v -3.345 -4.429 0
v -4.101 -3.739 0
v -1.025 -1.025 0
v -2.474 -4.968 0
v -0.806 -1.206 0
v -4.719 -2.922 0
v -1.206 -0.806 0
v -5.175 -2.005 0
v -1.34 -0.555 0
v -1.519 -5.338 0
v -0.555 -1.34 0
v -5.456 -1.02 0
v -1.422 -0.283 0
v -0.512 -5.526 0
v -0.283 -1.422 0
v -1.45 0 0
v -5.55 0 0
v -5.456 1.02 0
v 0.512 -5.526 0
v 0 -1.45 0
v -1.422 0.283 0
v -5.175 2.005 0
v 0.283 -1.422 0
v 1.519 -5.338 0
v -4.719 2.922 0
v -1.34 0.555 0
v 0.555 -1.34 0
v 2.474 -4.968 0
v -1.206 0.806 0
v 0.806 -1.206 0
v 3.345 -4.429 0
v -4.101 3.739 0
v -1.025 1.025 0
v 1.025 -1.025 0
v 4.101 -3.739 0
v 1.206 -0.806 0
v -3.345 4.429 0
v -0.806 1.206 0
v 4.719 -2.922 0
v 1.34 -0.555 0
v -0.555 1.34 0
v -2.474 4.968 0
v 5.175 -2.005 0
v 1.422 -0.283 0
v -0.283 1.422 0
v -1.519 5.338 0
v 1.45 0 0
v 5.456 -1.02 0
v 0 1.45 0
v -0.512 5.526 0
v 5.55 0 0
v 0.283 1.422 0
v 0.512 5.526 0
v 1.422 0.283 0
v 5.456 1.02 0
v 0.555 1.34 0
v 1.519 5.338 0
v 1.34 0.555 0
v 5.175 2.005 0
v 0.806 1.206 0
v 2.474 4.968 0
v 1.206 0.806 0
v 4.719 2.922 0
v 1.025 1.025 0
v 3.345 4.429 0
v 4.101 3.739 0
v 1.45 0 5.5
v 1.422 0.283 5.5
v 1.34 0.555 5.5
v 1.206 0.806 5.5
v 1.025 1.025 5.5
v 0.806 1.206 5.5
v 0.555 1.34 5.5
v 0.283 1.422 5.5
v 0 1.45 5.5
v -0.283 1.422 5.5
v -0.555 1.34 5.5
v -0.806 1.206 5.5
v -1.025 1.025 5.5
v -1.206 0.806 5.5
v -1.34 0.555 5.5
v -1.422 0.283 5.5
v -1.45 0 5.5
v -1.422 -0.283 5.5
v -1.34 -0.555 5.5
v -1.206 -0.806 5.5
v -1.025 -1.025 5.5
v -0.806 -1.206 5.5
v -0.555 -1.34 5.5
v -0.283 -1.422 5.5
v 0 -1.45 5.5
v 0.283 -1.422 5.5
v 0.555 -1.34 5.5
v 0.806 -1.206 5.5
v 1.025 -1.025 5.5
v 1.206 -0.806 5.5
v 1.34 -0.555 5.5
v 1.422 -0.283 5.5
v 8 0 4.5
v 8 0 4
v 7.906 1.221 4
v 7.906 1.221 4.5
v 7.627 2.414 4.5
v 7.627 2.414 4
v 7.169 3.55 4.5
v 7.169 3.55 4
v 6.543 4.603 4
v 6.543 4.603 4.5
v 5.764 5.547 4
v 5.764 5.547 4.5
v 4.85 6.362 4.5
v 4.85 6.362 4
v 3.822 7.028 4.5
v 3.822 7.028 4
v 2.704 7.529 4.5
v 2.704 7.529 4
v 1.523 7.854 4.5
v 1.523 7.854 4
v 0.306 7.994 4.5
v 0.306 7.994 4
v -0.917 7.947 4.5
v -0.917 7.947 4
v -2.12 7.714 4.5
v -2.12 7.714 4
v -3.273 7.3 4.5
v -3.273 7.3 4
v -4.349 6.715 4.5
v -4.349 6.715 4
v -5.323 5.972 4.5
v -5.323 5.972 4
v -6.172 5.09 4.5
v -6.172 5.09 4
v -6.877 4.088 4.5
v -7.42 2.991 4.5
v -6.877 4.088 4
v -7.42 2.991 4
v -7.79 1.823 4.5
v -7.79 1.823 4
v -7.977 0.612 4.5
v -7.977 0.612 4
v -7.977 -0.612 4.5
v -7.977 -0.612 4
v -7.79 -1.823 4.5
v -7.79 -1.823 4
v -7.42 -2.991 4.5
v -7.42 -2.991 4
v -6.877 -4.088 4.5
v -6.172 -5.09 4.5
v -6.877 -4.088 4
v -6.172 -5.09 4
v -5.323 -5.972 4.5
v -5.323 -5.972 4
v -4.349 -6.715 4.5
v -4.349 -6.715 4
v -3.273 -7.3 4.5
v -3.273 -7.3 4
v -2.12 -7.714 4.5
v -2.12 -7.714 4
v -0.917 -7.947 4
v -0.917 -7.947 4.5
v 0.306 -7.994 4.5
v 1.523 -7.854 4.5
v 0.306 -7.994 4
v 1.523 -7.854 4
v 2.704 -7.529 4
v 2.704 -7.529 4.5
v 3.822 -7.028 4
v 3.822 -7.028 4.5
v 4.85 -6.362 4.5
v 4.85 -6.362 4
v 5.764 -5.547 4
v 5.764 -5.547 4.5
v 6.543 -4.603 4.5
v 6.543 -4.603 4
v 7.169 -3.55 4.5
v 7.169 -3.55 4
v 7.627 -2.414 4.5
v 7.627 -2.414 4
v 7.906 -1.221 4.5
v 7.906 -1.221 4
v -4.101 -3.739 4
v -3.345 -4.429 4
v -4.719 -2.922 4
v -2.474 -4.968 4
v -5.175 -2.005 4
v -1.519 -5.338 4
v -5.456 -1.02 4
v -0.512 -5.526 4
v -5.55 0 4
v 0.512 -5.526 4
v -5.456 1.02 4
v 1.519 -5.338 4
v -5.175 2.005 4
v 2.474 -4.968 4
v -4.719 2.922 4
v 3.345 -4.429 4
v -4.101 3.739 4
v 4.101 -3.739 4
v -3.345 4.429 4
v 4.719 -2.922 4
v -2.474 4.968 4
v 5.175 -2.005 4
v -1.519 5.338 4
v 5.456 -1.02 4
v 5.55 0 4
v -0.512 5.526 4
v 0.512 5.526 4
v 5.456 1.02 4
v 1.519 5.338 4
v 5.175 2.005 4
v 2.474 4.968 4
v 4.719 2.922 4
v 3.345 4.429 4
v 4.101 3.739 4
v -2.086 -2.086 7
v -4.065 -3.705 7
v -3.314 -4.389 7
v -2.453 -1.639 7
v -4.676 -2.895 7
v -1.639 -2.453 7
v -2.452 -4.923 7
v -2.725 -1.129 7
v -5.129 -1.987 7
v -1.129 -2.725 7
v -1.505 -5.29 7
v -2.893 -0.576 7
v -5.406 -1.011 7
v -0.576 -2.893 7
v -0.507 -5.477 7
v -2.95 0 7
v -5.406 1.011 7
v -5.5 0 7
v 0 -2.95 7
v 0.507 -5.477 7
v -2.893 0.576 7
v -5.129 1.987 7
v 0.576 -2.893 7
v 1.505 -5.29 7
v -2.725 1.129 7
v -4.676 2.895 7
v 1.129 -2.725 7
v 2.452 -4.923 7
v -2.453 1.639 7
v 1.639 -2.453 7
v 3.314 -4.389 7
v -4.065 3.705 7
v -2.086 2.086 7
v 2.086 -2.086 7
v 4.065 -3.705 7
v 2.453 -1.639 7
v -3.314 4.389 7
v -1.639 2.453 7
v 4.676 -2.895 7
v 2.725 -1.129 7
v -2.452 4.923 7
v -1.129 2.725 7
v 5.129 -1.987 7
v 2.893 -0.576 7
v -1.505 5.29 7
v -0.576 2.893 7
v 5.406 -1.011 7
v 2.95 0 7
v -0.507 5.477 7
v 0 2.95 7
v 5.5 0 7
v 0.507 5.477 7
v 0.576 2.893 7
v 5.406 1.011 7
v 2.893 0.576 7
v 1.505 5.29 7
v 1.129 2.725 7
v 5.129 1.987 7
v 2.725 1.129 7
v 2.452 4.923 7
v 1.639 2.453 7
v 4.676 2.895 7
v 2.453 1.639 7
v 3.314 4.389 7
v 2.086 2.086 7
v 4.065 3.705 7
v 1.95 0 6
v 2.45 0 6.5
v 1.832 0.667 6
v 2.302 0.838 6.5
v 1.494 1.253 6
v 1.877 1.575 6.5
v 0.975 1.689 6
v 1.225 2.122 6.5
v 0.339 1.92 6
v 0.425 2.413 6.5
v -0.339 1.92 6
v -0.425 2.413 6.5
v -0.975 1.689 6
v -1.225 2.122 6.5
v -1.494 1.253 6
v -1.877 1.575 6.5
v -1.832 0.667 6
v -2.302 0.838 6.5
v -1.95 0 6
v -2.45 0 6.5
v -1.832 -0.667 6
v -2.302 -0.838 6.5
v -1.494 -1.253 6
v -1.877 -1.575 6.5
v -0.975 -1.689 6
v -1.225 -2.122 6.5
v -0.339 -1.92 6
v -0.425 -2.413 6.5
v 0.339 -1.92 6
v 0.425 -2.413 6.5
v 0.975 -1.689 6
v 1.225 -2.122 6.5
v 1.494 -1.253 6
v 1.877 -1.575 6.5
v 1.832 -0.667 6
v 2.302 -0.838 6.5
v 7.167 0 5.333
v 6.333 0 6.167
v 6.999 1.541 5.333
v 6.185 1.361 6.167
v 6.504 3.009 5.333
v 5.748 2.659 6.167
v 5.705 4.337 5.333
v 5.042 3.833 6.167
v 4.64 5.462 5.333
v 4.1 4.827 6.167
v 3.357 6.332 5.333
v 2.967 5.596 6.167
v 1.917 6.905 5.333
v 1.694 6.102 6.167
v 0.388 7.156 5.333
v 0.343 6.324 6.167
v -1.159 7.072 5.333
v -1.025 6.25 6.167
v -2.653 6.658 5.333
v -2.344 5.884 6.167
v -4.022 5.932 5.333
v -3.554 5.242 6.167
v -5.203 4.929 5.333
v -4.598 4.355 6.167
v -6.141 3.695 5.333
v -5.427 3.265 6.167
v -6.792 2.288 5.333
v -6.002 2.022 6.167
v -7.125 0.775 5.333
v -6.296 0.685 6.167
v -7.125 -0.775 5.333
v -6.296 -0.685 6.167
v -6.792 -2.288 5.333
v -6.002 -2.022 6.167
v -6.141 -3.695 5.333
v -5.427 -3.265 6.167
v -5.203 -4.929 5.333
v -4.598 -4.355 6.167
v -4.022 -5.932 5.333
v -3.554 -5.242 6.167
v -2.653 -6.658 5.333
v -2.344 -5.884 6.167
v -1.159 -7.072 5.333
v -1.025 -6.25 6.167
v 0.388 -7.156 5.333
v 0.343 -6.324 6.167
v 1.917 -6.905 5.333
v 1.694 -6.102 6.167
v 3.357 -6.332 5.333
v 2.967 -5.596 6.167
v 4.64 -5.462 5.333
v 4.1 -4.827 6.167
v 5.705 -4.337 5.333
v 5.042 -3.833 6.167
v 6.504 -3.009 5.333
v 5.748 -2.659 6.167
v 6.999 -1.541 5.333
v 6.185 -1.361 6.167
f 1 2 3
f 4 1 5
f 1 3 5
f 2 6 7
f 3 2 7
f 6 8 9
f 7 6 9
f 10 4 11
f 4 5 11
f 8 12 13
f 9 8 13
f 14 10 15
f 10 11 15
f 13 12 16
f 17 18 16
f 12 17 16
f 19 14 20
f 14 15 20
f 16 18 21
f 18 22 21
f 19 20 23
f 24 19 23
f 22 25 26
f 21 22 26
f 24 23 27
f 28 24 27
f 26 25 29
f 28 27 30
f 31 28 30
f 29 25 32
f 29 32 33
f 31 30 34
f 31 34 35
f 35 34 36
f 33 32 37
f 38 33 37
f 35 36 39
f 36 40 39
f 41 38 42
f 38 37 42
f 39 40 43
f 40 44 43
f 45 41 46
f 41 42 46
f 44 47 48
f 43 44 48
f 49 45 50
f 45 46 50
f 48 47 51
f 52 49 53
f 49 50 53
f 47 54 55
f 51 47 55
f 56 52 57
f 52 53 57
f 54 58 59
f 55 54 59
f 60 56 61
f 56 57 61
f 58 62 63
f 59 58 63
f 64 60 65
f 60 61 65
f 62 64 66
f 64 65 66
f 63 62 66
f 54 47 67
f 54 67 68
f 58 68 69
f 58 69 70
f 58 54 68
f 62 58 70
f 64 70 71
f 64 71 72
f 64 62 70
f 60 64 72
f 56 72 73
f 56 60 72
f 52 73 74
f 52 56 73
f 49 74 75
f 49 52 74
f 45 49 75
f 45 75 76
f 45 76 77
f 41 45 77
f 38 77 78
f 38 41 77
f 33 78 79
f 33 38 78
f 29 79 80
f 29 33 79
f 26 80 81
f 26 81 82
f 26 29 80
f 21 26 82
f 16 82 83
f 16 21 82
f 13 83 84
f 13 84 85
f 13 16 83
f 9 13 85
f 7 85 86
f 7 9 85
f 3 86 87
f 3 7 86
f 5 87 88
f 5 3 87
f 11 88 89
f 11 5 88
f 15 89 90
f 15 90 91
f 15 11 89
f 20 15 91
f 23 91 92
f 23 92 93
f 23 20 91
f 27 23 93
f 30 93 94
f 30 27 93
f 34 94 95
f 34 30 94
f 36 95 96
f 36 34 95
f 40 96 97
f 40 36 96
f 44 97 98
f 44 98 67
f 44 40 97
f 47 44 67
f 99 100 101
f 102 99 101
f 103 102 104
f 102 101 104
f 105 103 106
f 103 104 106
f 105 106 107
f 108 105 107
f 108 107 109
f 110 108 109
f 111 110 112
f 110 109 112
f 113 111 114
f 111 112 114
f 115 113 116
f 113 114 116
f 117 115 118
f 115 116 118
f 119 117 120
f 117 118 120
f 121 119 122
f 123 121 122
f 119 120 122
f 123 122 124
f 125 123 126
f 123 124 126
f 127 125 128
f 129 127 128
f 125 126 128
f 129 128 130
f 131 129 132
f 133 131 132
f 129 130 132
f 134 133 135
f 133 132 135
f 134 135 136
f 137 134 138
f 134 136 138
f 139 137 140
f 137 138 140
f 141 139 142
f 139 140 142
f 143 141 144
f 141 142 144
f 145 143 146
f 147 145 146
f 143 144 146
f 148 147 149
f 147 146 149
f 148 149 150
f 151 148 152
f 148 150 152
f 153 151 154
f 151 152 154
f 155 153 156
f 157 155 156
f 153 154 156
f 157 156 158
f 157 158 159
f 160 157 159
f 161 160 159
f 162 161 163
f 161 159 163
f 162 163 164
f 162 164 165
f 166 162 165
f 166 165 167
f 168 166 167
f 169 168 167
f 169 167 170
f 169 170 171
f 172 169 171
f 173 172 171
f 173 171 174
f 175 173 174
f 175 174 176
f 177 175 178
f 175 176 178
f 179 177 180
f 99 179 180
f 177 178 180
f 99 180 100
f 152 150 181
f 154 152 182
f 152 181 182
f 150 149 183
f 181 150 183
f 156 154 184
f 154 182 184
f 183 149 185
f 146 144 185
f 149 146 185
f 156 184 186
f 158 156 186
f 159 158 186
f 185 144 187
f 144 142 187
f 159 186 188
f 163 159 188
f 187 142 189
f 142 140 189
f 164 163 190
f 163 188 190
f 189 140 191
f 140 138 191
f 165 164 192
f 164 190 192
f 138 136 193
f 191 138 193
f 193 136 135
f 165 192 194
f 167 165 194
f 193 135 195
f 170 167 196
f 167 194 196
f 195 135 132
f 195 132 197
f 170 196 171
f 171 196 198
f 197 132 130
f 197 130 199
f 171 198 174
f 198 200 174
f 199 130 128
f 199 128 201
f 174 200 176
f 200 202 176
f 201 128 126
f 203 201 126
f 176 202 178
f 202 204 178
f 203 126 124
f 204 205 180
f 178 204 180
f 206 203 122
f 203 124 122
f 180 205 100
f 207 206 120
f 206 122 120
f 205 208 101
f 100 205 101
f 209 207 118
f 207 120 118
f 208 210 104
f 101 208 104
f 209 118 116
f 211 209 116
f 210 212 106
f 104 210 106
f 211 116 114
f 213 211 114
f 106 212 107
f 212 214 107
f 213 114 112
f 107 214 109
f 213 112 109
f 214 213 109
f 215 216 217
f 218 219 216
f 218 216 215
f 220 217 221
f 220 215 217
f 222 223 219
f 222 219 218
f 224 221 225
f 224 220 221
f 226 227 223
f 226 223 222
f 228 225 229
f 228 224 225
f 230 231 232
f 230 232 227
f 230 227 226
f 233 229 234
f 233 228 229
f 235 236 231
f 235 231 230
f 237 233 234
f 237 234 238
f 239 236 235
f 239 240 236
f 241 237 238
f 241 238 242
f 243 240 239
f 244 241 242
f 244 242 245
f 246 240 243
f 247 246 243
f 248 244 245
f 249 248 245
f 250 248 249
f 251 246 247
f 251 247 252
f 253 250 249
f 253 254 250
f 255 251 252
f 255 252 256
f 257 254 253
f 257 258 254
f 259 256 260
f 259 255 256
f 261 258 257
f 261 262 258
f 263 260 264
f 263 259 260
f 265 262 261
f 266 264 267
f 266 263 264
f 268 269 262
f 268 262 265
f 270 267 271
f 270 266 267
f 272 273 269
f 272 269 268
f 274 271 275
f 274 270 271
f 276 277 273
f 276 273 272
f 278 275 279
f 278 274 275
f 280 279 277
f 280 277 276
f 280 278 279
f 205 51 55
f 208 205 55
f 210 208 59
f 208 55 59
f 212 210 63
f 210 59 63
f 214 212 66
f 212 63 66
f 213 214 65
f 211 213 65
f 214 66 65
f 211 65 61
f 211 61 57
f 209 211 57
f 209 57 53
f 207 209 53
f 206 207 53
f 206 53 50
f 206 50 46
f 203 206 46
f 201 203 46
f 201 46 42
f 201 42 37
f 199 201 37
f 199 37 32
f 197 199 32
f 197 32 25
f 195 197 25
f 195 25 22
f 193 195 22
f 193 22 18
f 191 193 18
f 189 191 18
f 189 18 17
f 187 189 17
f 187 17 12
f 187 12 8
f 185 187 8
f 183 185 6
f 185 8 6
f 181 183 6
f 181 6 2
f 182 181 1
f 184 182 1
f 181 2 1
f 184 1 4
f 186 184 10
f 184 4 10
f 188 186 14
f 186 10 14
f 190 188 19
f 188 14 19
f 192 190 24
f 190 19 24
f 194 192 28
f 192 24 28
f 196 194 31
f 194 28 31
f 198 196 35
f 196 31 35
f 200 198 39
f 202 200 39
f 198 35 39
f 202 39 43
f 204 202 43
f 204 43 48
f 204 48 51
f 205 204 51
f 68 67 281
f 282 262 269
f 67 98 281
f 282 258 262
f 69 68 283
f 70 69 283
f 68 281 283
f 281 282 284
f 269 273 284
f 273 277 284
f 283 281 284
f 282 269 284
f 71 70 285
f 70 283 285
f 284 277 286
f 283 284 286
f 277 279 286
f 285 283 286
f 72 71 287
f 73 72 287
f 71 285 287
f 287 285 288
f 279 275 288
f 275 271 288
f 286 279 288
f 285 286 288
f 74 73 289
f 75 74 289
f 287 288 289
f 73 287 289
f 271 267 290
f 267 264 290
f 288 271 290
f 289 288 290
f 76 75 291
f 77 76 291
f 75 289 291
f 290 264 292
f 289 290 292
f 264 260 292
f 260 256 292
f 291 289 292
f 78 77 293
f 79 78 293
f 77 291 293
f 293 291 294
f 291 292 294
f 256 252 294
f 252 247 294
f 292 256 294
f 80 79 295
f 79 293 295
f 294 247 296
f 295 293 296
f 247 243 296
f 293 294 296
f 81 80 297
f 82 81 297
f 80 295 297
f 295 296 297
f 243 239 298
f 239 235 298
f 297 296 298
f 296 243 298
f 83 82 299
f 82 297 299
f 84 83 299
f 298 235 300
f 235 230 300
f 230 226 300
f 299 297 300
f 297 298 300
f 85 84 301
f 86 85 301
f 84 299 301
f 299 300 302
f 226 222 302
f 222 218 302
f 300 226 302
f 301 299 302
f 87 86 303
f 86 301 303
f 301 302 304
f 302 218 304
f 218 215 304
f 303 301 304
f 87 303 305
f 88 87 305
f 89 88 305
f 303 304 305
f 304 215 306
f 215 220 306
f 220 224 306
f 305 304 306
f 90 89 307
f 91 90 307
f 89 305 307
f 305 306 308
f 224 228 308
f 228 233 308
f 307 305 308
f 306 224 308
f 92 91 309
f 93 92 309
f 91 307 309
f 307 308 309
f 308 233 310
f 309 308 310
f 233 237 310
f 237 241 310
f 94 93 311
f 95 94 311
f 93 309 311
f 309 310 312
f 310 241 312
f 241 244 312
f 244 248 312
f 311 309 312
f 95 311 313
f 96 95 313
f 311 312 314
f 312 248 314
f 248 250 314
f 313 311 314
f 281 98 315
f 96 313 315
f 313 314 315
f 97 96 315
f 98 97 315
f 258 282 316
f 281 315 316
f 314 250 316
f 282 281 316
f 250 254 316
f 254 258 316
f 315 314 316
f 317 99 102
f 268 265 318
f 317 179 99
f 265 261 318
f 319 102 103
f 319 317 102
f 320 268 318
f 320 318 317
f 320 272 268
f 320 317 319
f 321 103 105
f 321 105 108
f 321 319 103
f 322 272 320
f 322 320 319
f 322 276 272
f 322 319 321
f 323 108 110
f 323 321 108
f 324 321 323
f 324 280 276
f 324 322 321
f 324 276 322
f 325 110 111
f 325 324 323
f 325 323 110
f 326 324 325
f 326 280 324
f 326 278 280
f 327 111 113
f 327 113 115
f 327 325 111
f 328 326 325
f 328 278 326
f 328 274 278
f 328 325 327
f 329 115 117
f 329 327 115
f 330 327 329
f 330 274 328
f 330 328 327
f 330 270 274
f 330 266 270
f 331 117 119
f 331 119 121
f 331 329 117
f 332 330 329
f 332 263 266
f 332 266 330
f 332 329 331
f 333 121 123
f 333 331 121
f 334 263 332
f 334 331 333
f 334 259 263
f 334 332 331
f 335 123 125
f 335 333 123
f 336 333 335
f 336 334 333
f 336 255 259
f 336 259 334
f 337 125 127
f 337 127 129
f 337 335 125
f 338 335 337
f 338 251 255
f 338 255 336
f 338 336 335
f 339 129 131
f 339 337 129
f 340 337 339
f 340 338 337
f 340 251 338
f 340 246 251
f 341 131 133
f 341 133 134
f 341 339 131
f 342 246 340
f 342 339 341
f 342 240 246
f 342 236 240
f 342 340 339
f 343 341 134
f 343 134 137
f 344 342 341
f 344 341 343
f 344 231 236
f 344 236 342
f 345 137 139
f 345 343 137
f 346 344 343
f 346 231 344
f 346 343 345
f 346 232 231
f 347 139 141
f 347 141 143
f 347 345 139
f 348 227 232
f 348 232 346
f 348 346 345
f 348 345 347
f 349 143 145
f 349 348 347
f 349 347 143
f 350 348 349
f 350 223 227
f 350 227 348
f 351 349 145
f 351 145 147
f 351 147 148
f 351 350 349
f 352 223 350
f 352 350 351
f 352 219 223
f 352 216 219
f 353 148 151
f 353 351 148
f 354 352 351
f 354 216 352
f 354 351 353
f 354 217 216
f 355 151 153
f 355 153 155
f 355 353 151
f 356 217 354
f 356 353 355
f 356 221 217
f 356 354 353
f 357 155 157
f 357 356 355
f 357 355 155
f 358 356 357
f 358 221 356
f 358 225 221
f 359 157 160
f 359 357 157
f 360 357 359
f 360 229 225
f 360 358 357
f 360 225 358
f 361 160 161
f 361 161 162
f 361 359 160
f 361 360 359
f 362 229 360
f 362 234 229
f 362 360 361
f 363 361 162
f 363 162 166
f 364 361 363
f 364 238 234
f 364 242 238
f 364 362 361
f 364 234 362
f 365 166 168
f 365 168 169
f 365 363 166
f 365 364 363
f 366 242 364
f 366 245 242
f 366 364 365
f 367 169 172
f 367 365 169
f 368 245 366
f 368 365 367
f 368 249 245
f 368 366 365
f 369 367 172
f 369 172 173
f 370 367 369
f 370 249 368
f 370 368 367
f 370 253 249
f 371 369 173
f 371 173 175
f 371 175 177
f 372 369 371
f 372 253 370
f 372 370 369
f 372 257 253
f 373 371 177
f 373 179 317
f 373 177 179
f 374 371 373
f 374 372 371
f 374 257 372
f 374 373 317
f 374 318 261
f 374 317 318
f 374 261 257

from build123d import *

# Parameters (mm, degrees)
CROQUIS1_R              = 5.55
CROQUIS1_R_2            = 1.45
SALIENTE_EXTRUIR1_DEPTH = 7
CHAFL_N1_SIZE           = 1.5
CROQUIS2_R              = 8
CROQUIS2_R_2            = 5.55
SALIENTE_EXTRUIR2_DEPTH = 3
CHAFL_N2_SIZE           = 2.5


with BuildPart() as part:
    # Croquis1 → Saliente-Extruir1 (new body)
    with BuildSketch(Plane.XY):
        Circle(CROQUIS1_R)
        Circle(CROQUIS1_R_2, mode=Mode.SUBTRACT)
    extrude(amount=SALIENTE_EXTRUIR1_DEPTH)

    # Chaflán1
    chafl_n1_edges = [part.edges().sort_by_distance(p)[0] for p in [
        (-1.45, 0, 7),
    ]]
    chamfer(chafl_n1_edges, length=CHAFL_N1_SIZE)

    # Croquis2 → Saliente-Extruir2 (add)
    with BuildSketch(Plane.XY.offset(4)):
        Circle(CROQUIS2_R)
        Circle(CROQUIS2_R_2, mode=Mode.SUBTRACT)
    extrude(amount=SALIENTE_EXTRUIR2_DEPTH)

    # Chaflán2
    chafl_n2_edges = [part.edges().sort_by_distance(p)[0] for p in [
        (-8, 0, 7),
    ]]
    chamfer(chafl_n2_edges, length=CHAFL_N2_SIZE)


solid = part.part
